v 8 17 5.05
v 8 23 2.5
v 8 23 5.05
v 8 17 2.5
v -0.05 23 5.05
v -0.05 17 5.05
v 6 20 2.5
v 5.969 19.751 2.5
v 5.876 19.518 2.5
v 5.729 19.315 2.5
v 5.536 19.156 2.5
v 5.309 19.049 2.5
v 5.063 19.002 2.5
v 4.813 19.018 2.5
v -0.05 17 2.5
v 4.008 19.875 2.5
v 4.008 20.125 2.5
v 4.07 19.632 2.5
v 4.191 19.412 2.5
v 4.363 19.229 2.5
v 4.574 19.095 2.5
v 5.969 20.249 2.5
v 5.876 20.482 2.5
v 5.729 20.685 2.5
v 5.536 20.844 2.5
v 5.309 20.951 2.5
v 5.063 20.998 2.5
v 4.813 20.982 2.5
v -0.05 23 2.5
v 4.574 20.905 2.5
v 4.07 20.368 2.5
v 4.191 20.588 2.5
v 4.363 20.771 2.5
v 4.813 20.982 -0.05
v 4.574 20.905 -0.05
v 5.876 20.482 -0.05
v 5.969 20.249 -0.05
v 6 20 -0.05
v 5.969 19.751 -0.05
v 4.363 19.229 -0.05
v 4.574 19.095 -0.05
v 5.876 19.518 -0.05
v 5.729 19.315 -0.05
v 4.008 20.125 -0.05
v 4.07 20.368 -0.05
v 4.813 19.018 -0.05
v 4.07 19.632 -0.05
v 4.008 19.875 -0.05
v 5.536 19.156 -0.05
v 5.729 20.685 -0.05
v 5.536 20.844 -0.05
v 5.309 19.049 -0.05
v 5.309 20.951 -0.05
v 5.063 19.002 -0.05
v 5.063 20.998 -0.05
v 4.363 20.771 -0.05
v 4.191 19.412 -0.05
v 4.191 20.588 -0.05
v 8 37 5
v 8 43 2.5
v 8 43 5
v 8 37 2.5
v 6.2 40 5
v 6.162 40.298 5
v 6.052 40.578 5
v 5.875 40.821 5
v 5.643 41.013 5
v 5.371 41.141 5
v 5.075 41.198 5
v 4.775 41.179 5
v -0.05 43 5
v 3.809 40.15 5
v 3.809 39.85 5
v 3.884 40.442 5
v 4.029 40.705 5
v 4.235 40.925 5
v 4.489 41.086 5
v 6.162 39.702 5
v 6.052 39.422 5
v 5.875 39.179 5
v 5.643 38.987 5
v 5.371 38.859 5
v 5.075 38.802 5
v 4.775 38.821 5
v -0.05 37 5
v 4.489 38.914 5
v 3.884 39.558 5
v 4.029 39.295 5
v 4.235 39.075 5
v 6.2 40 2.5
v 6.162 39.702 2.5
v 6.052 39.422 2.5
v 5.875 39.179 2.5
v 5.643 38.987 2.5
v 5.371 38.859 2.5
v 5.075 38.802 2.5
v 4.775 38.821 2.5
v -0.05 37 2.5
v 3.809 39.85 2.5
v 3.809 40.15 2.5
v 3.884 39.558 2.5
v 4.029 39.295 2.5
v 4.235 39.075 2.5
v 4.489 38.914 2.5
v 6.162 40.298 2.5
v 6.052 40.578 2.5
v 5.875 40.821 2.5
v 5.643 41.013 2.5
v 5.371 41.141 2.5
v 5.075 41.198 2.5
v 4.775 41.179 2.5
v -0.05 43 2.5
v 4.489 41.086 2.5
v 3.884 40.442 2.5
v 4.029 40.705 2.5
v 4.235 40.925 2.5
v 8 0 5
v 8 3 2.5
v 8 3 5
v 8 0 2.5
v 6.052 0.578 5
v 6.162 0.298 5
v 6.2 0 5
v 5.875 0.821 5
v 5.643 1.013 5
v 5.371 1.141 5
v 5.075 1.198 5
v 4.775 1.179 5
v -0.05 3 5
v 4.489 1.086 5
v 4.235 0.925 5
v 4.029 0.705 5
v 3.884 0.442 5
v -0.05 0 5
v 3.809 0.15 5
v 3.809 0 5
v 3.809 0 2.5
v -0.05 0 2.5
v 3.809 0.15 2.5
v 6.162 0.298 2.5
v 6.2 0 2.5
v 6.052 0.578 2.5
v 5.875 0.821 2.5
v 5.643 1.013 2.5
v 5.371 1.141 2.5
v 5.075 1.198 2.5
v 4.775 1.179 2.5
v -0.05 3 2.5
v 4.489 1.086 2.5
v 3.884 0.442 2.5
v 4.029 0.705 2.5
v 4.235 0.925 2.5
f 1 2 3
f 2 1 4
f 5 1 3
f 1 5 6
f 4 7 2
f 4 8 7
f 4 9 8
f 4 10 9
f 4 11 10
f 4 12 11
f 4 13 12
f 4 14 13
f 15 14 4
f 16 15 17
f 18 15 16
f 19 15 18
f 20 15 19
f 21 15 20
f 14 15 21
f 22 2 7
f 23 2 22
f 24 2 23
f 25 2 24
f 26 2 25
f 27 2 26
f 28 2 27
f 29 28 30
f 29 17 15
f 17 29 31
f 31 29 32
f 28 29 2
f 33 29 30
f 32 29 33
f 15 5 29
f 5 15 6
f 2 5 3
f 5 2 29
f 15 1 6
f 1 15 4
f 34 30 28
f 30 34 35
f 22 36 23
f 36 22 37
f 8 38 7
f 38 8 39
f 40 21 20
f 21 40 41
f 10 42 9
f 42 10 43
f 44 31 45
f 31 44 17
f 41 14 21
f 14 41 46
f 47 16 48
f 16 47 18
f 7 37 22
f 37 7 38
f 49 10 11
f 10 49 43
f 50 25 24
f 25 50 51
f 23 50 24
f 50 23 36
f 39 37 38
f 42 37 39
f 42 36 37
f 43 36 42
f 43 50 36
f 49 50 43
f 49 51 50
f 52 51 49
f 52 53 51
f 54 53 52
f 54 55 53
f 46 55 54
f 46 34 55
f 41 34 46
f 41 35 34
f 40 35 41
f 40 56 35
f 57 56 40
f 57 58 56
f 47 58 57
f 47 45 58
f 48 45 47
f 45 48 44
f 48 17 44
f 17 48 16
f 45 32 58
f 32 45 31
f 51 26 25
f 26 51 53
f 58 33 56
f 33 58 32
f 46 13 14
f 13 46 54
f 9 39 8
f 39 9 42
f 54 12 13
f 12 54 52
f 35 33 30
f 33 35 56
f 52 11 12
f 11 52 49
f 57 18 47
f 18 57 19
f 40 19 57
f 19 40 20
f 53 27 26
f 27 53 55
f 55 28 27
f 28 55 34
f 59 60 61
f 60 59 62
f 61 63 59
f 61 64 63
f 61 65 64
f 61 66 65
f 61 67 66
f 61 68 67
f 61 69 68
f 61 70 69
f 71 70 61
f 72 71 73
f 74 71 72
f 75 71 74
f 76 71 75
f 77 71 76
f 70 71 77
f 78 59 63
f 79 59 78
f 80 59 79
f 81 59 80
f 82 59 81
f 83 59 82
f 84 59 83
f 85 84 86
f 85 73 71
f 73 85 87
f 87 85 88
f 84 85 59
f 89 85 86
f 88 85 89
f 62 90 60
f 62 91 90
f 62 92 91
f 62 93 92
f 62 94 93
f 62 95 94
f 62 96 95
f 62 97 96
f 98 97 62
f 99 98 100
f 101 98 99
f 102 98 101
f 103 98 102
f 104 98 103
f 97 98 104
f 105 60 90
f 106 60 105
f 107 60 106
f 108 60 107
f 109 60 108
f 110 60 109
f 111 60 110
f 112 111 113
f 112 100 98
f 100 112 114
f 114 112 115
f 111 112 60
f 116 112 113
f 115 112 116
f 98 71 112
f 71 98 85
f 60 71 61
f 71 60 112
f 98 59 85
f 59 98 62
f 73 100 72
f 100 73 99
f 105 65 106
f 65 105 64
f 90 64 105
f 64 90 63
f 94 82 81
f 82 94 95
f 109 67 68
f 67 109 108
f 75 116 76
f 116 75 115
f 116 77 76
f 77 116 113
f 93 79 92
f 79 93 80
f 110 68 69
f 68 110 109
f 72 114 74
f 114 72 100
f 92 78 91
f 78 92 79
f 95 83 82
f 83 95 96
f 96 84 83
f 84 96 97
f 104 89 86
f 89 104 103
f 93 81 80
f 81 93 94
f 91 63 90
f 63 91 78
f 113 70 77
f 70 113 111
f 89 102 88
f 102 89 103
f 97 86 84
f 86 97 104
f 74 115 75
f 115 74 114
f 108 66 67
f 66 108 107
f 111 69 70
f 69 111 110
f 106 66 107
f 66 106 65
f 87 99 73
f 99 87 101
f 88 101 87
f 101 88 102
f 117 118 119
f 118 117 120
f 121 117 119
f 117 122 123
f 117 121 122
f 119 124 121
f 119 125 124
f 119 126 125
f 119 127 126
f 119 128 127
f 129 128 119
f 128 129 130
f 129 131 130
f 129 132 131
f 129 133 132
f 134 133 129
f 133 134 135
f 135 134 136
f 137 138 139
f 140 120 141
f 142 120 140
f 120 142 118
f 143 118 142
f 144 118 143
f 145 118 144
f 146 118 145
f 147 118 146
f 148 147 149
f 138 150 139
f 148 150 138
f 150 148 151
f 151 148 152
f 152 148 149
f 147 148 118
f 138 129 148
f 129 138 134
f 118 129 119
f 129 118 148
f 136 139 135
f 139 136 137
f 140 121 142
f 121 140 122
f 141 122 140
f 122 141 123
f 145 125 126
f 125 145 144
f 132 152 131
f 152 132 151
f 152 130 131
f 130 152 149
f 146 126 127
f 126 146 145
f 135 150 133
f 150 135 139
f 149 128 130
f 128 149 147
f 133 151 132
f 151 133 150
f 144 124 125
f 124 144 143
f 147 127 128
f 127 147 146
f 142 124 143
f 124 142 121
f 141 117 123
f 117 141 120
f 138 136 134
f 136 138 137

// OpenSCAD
// file: ../Settings.scad
// Mesurements Of Platform Actual & Global Settings
// Mesurements ACTUAL
PlateWidth = 228;
PlateDepth = 145;
PlateHeight = 5;

ArmWidth = 20;
ArmHeight = 24;
ArmForwardProjection = 25;
ArmRearProjection = 50;
ArmVOffset = 15;

BaseWidth = 129;
BaseHeight = 5;
BaseForwardProjection = 10;
BaseRearProjection = 10;
BaseVOffset = 20;

BaseDeflectorLength = 20;
BaseDeflectorAngle = 45;

ScrewsWidthOutset = 35;
ScrewsDepthOutset = 35;
ScrewsHeadRadius = 10;
ScrewsHeadHeight = 2;
ScrewsHeadProtrusion = 5;
ScrewsShaftRadius = 2;
ScrewsHeadCutoutRadius = 2;

RearPlugWidth = 10;
RearPlugHeight = 5;
RearPlugVOffset = 1;

// Options
// ****************************************************************************************************

d = 0.05;   //Delta

ClipSticksize = 8;
PlateThickness = 5;

TensionerBearingRadius = 2;
TensionerOffsetRadius = 15;
TensionerAngle = 45;
TensionerBearingExtention = 3;
TensionerInset = 2;

//lips to keep the belt in
Lip = 3;
//TopLip = 500;
BottomLip = 5;

MidPlateOverlap = 20;
MidPlateOverlapHeight = 10;
MidPlateOverlapOffset = 7;
ClipHoleSize = 5;

LowerPlateCrossover =10;

RollerCore = 2;
RollerClearance = 2;
RollerLength = PlateDepth - 2*RollerClearance;

UpperRollerProjection  = 40;
UpperRollerRadius = 8;

LowerRollerProjection = 20;
LowerRollerRadius = 6;

RollerBearingCutoutRadius = 3;

IbeamProjection = 15;
IbeamPlateThikness = 6;


// Calculated
// ************************************************************************************************************
PlateX = BaseWidth/2;

RollerLength = PlateDepth - 2*RollerClearance;
PlateArmOverhang = PlateWidth/2 - BaseWidth/2  - ArmWidth; 

UpperRollerPlateX = ArmWidth+PlateArmOverhang+UpperRollerProjection-UpperRollerRadius;
UpperRollerPlateY = -UpperRollerRadius; 

LowerRollerPlateX = ArmWidth+PlateArmOverhang+LowerRollerProjection-LowerRollerRadius;
LowerRollerPlateY = -(ArmVOffset+ArmHeight)+LowerRollerRadius;
// main file
include <../Settings.scad>;

ConnectorDefaults_Length = 8;
ConnectorDefaults_Width = 6;
ConnectorDefaults_Thickness = 5;
ConnectorDefaults_HoleRadius = 1;
ConnectorDefaults_SlipRadius = 0.2; // Radius increase in clip to allow thread to slip

ConnectorTest();

module Clip(
Length =ConnectorDefaults_Length,
Width = ConnectorDefaults_Width,
Thickness = ConnectorDefaults_Thickness,
HoleRadius = ConnectorDefaults_HoleRadius,
SlipRadius = ConnectorDefaults_SlipRadius){
	translate(v = [0,-Width/2,Thickness/2])
		difference(){
			translate(v = [-d,0,0]){
				cube(size=[Length+d,Width,Thickness/2]);
			}
			translate(v = [Length-(Width/2),Width/2,-d])
				color("blue")cylinder(h=Thickness+2*d,r= HoleRadius+SlipRadius, $fn =25);
		}
}

module ClipHole(
Length =ConnectorDefaults_Length,
Width = ConnectorDefaults_Width,
Thickness = ConnectorDefaults_Thickness,
HoleRadius = ConnectorDefaults_HoleRadius){
translate(v = [0,-Width/2,Thickness/2])
	union(){
		translate(v = [-d,0,0])
			cube(size=[Length+d,Width,Thickness/2+d]);
		translate(v = [Length-(Width/2),Width/2,(-Thickness/2)-d])
			color("red")cylinder(h=Thickness+2*d,r= HoleRadius, $fn =25);
	}
}





module ConnectorTest(){

	translate(v = [0,20,0])
		ClipHole();

	translate(v = [0,40,0])
		Clip();

	%color("green") difference(){
		union(){
			difference(){
				translate(v = [-5,-10,0])
					cube(size = [30,20,5]);
			
				translate(v = [0,0,0])
					ClipHole();
			}
		}
		translate(v = [-6,-22,-1])
			color("green") cube(size = [32,22,7]);
	}

	difference(){
		translate(v = [0,0,0])
			color("red") Clip();
		translate(v = [-6,-22,-1])
			color("red") cube(size = [32,22,7]);
	}
}
